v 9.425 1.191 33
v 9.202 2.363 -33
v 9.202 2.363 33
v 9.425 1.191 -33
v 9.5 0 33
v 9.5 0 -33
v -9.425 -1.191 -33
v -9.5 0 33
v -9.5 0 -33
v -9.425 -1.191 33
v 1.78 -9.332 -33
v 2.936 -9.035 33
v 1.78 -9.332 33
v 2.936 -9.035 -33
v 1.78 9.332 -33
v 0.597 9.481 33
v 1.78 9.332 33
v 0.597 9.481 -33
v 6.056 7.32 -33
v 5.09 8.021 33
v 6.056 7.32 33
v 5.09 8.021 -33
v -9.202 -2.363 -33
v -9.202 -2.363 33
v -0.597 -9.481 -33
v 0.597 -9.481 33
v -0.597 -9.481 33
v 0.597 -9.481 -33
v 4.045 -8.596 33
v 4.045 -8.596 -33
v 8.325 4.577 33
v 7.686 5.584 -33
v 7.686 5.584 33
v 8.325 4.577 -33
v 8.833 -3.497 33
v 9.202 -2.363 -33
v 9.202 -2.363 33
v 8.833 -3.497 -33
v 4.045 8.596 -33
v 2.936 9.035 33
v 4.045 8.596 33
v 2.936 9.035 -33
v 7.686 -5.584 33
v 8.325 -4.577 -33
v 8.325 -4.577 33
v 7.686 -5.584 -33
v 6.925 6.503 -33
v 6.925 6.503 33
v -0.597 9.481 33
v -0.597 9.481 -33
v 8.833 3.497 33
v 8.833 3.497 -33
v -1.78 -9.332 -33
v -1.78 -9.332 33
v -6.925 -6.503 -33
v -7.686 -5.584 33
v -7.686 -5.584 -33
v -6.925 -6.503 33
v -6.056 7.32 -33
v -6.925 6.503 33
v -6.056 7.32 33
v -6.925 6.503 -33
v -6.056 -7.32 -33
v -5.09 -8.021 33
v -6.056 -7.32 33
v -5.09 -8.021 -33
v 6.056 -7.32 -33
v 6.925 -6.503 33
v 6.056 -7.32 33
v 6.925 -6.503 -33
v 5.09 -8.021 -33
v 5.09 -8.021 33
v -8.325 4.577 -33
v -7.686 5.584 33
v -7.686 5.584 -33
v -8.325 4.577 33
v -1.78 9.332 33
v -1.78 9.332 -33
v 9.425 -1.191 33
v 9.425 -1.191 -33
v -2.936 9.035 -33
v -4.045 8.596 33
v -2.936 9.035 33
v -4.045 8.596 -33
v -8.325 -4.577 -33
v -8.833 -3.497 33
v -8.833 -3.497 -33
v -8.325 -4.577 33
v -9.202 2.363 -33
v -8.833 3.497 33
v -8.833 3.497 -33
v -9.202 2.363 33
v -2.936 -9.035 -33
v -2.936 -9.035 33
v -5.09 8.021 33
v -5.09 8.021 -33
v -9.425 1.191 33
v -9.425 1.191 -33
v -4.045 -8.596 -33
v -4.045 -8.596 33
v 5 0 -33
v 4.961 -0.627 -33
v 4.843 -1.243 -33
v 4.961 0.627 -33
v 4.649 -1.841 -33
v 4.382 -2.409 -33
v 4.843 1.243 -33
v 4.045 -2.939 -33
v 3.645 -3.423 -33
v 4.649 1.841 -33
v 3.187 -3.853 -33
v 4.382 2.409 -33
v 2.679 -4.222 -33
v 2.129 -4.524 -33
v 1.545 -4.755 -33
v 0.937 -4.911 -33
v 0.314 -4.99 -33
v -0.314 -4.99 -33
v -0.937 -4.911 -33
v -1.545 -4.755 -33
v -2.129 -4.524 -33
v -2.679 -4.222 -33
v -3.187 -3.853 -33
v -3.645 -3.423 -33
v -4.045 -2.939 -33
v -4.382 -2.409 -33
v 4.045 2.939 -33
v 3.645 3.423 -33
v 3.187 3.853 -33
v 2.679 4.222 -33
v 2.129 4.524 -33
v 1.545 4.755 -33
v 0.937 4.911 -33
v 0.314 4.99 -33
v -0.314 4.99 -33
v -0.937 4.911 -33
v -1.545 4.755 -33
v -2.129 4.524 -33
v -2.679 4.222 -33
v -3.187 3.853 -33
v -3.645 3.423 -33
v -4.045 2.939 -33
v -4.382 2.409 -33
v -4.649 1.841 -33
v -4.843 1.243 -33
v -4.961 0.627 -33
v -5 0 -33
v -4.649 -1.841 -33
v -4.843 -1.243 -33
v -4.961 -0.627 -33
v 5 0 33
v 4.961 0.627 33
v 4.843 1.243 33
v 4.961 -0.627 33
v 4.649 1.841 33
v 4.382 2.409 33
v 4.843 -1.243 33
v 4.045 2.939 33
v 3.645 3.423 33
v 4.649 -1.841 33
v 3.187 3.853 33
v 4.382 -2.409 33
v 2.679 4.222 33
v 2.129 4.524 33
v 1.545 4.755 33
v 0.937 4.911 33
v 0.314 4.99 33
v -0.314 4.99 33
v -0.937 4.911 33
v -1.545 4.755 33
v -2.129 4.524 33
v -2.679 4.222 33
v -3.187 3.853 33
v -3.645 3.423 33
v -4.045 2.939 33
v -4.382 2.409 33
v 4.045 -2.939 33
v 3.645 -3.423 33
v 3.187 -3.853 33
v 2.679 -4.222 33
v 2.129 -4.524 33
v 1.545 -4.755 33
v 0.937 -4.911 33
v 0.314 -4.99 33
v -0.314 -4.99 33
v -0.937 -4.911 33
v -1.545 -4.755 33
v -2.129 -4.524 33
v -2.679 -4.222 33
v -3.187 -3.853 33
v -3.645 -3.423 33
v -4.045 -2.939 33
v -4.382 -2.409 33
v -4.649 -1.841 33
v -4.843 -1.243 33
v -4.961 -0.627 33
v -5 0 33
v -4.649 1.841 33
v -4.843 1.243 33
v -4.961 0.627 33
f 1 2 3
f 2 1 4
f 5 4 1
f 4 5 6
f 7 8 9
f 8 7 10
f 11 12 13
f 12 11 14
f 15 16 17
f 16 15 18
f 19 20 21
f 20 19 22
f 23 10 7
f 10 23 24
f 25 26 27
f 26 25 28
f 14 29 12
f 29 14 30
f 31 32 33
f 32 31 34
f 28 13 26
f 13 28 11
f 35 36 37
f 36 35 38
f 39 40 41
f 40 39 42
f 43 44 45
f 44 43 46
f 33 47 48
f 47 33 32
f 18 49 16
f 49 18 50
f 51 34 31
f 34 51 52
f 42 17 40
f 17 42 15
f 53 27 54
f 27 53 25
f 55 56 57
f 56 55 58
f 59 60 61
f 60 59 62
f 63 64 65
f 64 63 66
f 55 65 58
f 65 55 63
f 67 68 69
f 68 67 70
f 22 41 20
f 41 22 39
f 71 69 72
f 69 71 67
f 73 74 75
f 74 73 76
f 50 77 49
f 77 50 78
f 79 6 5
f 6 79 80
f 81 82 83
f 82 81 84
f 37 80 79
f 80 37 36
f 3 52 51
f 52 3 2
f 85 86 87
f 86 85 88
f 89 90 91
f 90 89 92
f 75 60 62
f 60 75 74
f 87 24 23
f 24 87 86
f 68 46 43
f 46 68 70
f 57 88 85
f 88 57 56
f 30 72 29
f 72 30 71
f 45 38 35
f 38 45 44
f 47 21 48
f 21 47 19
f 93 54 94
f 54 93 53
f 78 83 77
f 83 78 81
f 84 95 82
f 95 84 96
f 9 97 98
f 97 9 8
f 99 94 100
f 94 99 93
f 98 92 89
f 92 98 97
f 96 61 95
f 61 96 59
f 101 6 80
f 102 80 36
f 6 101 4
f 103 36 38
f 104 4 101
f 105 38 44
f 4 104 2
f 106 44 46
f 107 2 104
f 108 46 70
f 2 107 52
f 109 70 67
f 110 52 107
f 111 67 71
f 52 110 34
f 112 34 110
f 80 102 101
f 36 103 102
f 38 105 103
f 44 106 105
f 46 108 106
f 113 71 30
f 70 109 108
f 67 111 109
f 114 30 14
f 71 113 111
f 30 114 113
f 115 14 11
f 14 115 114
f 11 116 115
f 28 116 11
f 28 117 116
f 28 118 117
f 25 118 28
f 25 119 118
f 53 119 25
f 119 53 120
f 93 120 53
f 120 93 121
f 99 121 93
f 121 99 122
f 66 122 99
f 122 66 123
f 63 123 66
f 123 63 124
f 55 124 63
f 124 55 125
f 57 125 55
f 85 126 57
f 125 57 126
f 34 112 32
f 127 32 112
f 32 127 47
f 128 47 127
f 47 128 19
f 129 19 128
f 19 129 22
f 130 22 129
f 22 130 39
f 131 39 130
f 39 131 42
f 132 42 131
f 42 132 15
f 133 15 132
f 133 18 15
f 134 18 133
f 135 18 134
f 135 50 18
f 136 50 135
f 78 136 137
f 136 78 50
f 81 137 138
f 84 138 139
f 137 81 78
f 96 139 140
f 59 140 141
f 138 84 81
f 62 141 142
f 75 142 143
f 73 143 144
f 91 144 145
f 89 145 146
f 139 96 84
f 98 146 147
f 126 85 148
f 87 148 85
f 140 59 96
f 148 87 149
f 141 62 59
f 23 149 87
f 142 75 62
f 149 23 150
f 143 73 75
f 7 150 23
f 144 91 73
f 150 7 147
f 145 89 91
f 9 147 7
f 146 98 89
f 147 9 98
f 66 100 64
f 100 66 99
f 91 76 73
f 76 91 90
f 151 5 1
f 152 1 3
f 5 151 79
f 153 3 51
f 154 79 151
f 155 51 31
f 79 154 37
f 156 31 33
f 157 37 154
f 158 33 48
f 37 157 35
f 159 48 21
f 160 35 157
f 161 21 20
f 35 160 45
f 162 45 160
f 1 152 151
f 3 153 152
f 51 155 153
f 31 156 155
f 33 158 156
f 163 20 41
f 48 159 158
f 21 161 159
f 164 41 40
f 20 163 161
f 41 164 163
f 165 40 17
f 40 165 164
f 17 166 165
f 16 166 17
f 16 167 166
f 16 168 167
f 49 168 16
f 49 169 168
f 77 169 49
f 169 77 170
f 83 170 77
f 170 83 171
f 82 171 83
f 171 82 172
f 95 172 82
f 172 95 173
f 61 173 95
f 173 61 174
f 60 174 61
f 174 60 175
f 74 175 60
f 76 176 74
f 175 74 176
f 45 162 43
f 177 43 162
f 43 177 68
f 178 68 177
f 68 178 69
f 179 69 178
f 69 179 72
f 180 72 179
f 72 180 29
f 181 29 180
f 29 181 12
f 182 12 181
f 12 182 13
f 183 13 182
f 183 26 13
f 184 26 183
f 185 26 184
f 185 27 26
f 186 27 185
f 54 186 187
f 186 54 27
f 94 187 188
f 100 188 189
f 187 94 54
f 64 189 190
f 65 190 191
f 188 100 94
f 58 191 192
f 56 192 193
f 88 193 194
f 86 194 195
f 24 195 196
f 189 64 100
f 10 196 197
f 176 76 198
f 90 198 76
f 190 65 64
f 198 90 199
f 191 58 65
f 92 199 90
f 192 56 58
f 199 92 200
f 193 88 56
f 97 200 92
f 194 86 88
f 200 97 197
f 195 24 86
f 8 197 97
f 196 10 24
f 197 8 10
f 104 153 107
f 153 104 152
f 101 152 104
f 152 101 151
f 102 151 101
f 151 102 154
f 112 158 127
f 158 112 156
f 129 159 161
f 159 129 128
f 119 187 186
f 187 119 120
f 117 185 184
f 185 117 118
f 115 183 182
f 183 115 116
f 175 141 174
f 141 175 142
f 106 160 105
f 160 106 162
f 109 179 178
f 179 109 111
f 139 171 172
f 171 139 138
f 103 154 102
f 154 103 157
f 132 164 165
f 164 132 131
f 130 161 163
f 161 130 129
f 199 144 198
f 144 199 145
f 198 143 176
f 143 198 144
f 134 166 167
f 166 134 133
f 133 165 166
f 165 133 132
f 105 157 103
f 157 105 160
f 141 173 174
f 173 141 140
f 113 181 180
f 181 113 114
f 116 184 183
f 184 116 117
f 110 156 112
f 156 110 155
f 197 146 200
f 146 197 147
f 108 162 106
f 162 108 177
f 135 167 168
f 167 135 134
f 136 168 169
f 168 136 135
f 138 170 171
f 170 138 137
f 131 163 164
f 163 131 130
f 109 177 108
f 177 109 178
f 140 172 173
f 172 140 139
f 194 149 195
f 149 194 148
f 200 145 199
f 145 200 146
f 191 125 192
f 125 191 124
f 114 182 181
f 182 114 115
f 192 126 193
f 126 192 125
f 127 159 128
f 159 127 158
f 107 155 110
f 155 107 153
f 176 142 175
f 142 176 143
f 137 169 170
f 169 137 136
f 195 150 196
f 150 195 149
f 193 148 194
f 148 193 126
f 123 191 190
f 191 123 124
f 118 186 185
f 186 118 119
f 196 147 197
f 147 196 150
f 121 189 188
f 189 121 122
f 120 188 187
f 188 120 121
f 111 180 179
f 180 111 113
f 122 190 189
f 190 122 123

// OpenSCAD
$fn = 50;


difference() {
	union() {
		translate(v = [0, 0, -33.0000000000]) {
			cylinder(h = 66, r = 9.5000000000);
		}
	}
	union() {
		translate(v = [0, 0, -100.0000000000]) {
			cylinder(h = 200, r = 5.0000000000);
		}
	}
}
